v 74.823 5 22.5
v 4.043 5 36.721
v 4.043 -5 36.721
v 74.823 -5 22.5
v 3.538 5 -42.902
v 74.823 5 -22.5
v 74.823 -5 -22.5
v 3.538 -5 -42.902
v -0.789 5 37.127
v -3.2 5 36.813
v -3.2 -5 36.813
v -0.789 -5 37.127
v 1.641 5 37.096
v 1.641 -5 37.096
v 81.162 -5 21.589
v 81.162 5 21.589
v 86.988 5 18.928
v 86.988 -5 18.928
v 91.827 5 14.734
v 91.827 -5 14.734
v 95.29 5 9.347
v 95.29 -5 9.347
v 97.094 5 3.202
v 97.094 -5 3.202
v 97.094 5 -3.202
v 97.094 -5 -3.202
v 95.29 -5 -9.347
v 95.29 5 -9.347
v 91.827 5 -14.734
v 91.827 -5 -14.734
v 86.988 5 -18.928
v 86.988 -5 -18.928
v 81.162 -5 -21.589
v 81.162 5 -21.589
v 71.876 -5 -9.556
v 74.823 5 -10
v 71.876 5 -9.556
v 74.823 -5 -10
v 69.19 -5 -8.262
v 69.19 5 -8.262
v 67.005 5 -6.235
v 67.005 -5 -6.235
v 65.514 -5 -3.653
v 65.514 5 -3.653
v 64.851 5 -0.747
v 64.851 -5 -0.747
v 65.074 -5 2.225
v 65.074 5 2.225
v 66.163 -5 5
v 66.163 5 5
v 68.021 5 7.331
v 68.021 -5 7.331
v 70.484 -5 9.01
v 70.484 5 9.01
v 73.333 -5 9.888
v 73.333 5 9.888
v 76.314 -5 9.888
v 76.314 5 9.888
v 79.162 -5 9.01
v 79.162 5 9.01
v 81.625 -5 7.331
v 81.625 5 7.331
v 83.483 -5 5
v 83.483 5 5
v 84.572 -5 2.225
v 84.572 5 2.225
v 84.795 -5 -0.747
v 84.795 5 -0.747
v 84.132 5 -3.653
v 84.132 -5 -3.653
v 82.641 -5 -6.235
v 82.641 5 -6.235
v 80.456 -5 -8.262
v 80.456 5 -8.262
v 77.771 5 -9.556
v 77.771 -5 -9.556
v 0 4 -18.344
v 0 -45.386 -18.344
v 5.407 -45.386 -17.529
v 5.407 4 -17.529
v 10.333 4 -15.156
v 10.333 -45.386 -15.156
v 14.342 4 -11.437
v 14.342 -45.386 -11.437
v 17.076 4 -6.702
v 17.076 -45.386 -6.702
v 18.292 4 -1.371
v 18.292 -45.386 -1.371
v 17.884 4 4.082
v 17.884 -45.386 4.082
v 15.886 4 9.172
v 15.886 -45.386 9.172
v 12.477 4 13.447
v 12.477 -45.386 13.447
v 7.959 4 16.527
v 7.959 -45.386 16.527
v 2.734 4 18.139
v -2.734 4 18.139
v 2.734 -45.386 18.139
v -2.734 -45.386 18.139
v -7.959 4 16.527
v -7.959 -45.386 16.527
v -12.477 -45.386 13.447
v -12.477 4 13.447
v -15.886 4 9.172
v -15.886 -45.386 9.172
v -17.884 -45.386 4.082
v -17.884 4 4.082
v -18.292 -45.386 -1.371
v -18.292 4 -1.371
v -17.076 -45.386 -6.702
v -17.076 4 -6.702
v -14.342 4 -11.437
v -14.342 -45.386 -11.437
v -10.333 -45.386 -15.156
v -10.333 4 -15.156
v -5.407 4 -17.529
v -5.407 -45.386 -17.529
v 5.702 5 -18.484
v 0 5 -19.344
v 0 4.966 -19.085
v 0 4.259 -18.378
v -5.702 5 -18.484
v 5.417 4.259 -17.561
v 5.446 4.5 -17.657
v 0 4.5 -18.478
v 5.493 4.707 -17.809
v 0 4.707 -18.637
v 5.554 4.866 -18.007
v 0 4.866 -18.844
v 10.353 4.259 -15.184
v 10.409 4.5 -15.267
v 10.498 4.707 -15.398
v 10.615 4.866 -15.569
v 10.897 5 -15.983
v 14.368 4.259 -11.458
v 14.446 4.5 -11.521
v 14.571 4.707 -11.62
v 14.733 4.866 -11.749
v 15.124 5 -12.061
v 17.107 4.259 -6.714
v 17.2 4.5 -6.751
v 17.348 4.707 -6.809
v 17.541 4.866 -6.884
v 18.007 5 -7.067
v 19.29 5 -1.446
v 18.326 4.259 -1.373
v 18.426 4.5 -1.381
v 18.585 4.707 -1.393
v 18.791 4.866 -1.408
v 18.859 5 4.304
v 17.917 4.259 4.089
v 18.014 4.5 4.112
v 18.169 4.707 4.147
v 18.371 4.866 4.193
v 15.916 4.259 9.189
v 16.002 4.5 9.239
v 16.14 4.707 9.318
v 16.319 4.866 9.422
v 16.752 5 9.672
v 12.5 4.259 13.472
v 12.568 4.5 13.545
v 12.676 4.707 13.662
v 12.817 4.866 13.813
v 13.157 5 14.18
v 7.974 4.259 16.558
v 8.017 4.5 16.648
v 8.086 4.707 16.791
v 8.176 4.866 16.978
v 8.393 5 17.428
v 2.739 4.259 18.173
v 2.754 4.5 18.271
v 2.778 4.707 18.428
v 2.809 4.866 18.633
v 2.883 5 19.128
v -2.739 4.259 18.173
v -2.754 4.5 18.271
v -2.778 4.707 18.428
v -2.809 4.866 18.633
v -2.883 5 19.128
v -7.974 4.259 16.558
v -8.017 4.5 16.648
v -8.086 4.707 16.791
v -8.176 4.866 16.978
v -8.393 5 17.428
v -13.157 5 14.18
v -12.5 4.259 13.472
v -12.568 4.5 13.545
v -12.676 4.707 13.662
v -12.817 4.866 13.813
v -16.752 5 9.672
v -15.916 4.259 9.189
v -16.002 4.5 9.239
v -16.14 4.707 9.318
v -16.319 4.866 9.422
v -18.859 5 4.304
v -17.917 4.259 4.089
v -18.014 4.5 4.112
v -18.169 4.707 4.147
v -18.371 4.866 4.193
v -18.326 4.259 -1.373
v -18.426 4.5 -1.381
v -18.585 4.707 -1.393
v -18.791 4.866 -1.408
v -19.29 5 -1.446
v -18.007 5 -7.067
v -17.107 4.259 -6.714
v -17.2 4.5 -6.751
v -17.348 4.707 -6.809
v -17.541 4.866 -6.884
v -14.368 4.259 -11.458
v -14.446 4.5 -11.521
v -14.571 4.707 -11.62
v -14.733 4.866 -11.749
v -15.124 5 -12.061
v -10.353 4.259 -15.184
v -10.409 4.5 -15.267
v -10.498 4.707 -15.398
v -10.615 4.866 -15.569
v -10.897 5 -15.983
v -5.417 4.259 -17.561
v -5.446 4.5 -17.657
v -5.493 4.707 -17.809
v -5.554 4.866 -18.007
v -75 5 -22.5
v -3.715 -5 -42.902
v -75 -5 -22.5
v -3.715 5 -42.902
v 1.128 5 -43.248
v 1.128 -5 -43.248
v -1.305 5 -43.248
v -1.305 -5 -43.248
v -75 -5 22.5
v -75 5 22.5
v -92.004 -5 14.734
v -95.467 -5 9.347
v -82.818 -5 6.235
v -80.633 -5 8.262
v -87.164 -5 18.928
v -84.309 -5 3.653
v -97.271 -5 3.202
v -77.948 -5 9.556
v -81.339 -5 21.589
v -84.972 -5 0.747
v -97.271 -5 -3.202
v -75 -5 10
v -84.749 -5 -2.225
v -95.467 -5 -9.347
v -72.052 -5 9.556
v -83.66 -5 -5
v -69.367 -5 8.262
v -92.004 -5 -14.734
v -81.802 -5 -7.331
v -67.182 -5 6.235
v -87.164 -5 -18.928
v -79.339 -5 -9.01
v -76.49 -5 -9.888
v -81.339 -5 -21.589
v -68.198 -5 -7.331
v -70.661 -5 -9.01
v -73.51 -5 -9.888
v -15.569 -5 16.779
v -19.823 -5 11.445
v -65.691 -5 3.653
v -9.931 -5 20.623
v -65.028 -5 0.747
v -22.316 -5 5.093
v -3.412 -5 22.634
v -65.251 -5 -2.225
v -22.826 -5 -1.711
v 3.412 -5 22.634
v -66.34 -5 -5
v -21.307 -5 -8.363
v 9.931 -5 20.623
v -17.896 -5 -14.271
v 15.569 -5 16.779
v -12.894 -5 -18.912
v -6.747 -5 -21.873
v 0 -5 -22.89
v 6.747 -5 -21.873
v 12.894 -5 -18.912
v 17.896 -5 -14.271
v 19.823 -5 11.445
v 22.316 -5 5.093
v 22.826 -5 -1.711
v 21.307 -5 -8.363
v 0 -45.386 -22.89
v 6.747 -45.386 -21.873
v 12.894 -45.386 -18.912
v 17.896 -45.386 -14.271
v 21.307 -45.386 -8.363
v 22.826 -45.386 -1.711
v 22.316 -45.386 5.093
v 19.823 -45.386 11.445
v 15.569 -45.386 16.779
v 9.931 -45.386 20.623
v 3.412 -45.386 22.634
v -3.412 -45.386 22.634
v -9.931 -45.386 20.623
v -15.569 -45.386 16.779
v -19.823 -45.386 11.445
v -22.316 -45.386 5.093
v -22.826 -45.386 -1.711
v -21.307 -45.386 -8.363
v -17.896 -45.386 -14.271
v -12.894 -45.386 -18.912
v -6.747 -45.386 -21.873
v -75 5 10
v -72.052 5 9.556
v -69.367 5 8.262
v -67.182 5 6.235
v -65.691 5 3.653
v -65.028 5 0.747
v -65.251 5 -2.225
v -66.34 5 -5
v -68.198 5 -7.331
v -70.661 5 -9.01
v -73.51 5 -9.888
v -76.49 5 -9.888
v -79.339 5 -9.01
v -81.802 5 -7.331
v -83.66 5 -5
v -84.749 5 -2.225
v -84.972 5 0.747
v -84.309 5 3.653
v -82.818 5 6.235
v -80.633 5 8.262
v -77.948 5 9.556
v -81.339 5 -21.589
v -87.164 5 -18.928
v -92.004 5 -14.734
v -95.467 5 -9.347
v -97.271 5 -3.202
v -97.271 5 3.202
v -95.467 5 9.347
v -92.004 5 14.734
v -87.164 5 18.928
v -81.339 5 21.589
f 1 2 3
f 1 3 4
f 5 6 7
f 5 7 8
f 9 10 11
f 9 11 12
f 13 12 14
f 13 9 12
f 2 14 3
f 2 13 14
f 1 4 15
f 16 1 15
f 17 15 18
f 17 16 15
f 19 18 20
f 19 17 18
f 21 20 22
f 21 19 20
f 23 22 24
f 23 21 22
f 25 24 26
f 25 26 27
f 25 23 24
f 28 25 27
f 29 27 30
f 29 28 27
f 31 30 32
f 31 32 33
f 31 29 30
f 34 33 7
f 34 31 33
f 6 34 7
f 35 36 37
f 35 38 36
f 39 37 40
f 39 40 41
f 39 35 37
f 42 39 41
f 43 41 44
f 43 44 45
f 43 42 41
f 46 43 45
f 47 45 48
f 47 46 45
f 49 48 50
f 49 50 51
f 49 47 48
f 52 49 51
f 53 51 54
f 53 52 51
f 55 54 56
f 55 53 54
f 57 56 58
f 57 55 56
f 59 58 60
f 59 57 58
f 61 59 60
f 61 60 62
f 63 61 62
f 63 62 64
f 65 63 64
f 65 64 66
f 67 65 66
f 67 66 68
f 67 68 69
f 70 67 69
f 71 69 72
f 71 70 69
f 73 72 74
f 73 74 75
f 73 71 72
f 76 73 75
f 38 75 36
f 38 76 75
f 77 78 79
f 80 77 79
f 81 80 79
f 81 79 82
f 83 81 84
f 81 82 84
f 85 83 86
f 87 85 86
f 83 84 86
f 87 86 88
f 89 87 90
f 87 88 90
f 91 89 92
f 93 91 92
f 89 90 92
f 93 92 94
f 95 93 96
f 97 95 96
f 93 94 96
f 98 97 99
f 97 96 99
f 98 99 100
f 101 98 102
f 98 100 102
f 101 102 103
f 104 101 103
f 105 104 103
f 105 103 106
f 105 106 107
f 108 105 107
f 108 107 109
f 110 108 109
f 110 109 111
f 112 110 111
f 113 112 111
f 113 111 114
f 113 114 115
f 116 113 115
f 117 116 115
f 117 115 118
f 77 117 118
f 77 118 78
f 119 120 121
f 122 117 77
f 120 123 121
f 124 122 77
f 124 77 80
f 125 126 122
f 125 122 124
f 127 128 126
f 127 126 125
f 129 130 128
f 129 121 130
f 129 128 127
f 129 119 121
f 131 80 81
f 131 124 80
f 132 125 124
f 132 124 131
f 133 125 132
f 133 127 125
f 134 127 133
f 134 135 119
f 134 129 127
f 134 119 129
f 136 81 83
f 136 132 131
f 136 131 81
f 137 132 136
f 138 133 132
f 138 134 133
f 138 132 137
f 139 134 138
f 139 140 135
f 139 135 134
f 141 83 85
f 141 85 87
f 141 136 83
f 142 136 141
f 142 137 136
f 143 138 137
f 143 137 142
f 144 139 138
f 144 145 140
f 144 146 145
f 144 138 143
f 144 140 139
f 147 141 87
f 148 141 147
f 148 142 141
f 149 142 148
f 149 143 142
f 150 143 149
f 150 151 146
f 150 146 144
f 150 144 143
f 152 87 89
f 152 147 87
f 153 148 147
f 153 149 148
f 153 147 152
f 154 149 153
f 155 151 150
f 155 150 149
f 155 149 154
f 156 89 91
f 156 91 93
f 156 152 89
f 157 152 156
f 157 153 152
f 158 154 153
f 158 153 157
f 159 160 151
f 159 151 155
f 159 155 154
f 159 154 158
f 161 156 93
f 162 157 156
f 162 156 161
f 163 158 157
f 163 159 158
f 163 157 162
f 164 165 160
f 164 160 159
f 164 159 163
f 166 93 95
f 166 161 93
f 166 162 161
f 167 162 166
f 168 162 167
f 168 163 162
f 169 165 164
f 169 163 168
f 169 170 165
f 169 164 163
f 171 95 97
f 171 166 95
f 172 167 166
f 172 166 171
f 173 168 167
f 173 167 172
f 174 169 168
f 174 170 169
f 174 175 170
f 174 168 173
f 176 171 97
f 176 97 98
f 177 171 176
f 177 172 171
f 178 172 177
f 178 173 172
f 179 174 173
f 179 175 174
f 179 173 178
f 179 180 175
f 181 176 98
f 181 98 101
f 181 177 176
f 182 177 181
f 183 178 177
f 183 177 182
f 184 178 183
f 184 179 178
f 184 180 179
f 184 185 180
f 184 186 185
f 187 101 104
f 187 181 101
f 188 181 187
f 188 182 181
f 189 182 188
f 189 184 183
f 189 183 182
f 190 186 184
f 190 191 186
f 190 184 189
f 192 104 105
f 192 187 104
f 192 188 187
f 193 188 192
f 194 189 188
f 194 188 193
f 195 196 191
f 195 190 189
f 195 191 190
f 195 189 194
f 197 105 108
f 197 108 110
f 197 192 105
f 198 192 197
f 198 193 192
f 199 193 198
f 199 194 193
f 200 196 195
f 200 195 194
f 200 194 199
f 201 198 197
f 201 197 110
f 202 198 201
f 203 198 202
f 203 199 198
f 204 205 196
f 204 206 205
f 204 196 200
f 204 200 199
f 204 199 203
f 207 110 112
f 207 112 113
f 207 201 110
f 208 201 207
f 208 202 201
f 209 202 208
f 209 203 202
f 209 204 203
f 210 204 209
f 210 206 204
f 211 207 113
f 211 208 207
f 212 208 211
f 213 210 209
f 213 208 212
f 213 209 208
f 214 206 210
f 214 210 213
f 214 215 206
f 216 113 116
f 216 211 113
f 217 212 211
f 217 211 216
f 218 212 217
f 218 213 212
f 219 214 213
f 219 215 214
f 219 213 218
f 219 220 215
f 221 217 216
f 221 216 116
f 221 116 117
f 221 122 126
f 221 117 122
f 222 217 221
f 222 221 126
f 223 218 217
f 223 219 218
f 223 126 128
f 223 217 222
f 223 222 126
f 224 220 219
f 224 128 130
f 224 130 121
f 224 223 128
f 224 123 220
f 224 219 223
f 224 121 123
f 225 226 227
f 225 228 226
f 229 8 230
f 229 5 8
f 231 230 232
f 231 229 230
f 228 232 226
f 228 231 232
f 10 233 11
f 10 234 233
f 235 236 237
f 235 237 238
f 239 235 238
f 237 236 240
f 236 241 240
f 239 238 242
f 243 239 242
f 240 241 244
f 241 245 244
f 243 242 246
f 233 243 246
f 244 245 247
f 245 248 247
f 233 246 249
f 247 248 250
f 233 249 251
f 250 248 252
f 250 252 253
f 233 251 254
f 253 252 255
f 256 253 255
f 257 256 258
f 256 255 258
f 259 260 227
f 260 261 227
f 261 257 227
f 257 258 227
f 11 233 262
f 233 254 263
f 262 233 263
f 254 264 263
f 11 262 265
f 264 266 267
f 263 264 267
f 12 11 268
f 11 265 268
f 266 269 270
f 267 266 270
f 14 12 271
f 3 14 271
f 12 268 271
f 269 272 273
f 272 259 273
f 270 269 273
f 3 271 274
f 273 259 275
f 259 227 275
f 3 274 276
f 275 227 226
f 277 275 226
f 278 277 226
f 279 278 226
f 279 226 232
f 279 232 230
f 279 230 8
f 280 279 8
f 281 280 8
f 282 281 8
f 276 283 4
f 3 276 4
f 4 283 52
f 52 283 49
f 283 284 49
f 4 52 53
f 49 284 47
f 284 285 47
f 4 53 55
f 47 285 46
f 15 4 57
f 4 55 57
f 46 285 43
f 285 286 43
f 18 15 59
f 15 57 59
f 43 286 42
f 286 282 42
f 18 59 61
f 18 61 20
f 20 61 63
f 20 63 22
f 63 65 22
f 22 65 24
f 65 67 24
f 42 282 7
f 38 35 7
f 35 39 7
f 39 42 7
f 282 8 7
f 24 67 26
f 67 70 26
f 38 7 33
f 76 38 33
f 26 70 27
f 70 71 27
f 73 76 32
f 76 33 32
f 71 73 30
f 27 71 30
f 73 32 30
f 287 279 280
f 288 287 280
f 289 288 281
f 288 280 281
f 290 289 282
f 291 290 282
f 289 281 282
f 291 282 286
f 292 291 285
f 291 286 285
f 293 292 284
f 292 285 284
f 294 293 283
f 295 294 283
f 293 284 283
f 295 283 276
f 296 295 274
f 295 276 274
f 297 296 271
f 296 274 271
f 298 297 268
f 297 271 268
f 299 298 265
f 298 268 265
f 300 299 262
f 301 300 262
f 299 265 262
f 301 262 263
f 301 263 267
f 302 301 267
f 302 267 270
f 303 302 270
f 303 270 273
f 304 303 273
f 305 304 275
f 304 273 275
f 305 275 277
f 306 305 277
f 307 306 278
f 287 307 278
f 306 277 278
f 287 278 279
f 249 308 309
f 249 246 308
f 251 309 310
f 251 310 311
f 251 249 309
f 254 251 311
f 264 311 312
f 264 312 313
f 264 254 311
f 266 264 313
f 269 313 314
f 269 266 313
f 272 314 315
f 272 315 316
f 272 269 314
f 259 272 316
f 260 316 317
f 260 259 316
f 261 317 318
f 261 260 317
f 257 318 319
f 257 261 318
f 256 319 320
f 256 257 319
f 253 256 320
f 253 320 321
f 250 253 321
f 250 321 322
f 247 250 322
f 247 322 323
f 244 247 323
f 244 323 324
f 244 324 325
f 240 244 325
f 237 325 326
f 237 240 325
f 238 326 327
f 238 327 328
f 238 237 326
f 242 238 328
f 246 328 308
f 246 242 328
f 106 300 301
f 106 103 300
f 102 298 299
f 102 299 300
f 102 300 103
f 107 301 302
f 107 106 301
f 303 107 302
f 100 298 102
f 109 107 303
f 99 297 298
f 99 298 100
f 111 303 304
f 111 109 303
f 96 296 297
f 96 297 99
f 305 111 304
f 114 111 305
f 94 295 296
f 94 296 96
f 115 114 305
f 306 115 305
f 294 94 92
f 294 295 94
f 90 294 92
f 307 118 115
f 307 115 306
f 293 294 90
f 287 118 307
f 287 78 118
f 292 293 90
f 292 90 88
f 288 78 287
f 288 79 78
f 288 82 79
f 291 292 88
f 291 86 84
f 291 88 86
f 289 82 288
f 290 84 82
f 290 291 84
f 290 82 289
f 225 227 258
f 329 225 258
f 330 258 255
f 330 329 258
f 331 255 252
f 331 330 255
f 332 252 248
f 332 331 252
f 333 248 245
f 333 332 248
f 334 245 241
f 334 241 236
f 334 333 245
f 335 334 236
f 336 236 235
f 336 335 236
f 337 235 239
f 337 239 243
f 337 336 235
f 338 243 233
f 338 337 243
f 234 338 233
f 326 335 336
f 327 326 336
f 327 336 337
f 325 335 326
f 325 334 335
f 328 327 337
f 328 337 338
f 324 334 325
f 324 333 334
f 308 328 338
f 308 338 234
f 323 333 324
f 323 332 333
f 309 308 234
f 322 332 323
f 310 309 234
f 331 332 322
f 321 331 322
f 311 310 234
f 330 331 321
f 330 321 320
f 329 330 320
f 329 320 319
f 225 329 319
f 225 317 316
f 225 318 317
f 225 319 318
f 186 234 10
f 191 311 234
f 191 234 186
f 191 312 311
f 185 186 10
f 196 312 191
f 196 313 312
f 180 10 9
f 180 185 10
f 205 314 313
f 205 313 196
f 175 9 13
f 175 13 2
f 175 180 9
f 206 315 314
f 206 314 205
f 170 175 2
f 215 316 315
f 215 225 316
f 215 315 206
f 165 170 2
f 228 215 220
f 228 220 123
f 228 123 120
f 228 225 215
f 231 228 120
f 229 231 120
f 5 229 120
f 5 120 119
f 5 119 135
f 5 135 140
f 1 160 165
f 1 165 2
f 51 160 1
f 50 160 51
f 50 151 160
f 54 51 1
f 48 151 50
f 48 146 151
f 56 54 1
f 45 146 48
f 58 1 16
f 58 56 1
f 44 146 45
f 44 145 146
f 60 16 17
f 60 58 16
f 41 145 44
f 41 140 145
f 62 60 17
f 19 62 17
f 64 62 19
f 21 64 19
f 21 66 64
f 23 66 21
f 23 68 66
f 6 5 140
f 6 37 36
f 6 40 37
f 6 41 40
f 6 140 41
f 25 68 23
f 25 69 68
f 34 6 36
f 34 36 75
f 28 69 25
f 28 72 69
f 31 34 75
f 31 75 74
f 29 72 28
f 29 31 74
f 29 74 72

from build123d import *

# Parameters (mm, degrees)
SKETCH1_R           = 17.785523023
SKETCH1_R_2         = 10
BOSS_EXTRUDE1_DEPTH = 5
SKETCH2_R           = 22.889678729
BOSS_EXTRUDE2_DEPTH = 40.386280802
SKETCH4_R           = 18.343761553
CUT_EXTRUDE1_DEPTH  = 60
FILLET1_R           = 1


with BuildPart() as part:
    # Sketch1 → Boss-Extrude1 (new, symmetric)
    with BuildSketch(Plane(origin=(0, 0, 0), x_dir=(1, 0, 0), z_dir=(0, 1, 0))):
        with BuildLine():
            Line((-75, -22.5), (-3.19997264, -36.813396757))
            ThreePointArc((-3.19997264, -36.813396757), (0.426652195, -37.154633481), (4.043342361, -36.720579984))
            Line((4.043342361, -36.720579984), (74.823113208, -22.5))
            ThreePointArc((74.823113208, -22.5), (97.323113208, 0), (74.823113208, 22.5))
            Line((74.823113208, 22.5), (3.537735849, 42.902368838))
            ThreePointArc((3.537735849, 42.902368838), (-0.088443396, 43.290961135), (-3.714622642, 42.902368838))
            Line((-3.714622642, 42.902368838), (-75, 22.5))
            ThreePointArc((-75, 22.5), (-97.5, 0), (-75, -22.5))
        make_face()
        with Locations(Location((0, 0, 0), (0, 0, 270))):
            Circle(SKETCH1_R, mode=Mode.SUBTRACT)
        with Locations(Location((-75, 0, 0), (0, 0, 270))):
            Circle(SKETCH1_R_2, mode=Mode.SUBTRACT)
        with Locations(Location((74.823113208, 0, 0), (0, 0, 90))):
            Circle(SKETCH1_R_2, mode=Mode.SUBTRACT)
    extrude(amount=BOSS_EXTRUDE1_DEPTH, both=True)

    # Sketch2 → Boss-Extrude2 (add)
    with BuildSketch(Plane.XZ.offset(5)):
        with Locations(Location((0, 0, 0), (0, 0, 270))):
            Circle(SKETCH2_R)
    extrude(amount=BOSS_EXTRUDE2_DEPTH)

    # Sketch4 → Cut-Extrude1 (cut)
    with BuildSketch(Plane.XZ.offset(45.386280802)):
        with Locations(Location((0, 0, 0), (0, 0, 270))):
            Circle(SKETCH4_R)
    extrude(amount=-CUT_EXTRUDE1_DEPTH, mode=Mode.SUBTRACT)

    # Fillet1
    fillet1_edges = [part.edges().sort_by_distance(p)[0] for p in [
        (0, 5, 18.343761553),
    ]]
    fillet(fillet1_edges, radius=FILLET1_R)


solid = part.part
